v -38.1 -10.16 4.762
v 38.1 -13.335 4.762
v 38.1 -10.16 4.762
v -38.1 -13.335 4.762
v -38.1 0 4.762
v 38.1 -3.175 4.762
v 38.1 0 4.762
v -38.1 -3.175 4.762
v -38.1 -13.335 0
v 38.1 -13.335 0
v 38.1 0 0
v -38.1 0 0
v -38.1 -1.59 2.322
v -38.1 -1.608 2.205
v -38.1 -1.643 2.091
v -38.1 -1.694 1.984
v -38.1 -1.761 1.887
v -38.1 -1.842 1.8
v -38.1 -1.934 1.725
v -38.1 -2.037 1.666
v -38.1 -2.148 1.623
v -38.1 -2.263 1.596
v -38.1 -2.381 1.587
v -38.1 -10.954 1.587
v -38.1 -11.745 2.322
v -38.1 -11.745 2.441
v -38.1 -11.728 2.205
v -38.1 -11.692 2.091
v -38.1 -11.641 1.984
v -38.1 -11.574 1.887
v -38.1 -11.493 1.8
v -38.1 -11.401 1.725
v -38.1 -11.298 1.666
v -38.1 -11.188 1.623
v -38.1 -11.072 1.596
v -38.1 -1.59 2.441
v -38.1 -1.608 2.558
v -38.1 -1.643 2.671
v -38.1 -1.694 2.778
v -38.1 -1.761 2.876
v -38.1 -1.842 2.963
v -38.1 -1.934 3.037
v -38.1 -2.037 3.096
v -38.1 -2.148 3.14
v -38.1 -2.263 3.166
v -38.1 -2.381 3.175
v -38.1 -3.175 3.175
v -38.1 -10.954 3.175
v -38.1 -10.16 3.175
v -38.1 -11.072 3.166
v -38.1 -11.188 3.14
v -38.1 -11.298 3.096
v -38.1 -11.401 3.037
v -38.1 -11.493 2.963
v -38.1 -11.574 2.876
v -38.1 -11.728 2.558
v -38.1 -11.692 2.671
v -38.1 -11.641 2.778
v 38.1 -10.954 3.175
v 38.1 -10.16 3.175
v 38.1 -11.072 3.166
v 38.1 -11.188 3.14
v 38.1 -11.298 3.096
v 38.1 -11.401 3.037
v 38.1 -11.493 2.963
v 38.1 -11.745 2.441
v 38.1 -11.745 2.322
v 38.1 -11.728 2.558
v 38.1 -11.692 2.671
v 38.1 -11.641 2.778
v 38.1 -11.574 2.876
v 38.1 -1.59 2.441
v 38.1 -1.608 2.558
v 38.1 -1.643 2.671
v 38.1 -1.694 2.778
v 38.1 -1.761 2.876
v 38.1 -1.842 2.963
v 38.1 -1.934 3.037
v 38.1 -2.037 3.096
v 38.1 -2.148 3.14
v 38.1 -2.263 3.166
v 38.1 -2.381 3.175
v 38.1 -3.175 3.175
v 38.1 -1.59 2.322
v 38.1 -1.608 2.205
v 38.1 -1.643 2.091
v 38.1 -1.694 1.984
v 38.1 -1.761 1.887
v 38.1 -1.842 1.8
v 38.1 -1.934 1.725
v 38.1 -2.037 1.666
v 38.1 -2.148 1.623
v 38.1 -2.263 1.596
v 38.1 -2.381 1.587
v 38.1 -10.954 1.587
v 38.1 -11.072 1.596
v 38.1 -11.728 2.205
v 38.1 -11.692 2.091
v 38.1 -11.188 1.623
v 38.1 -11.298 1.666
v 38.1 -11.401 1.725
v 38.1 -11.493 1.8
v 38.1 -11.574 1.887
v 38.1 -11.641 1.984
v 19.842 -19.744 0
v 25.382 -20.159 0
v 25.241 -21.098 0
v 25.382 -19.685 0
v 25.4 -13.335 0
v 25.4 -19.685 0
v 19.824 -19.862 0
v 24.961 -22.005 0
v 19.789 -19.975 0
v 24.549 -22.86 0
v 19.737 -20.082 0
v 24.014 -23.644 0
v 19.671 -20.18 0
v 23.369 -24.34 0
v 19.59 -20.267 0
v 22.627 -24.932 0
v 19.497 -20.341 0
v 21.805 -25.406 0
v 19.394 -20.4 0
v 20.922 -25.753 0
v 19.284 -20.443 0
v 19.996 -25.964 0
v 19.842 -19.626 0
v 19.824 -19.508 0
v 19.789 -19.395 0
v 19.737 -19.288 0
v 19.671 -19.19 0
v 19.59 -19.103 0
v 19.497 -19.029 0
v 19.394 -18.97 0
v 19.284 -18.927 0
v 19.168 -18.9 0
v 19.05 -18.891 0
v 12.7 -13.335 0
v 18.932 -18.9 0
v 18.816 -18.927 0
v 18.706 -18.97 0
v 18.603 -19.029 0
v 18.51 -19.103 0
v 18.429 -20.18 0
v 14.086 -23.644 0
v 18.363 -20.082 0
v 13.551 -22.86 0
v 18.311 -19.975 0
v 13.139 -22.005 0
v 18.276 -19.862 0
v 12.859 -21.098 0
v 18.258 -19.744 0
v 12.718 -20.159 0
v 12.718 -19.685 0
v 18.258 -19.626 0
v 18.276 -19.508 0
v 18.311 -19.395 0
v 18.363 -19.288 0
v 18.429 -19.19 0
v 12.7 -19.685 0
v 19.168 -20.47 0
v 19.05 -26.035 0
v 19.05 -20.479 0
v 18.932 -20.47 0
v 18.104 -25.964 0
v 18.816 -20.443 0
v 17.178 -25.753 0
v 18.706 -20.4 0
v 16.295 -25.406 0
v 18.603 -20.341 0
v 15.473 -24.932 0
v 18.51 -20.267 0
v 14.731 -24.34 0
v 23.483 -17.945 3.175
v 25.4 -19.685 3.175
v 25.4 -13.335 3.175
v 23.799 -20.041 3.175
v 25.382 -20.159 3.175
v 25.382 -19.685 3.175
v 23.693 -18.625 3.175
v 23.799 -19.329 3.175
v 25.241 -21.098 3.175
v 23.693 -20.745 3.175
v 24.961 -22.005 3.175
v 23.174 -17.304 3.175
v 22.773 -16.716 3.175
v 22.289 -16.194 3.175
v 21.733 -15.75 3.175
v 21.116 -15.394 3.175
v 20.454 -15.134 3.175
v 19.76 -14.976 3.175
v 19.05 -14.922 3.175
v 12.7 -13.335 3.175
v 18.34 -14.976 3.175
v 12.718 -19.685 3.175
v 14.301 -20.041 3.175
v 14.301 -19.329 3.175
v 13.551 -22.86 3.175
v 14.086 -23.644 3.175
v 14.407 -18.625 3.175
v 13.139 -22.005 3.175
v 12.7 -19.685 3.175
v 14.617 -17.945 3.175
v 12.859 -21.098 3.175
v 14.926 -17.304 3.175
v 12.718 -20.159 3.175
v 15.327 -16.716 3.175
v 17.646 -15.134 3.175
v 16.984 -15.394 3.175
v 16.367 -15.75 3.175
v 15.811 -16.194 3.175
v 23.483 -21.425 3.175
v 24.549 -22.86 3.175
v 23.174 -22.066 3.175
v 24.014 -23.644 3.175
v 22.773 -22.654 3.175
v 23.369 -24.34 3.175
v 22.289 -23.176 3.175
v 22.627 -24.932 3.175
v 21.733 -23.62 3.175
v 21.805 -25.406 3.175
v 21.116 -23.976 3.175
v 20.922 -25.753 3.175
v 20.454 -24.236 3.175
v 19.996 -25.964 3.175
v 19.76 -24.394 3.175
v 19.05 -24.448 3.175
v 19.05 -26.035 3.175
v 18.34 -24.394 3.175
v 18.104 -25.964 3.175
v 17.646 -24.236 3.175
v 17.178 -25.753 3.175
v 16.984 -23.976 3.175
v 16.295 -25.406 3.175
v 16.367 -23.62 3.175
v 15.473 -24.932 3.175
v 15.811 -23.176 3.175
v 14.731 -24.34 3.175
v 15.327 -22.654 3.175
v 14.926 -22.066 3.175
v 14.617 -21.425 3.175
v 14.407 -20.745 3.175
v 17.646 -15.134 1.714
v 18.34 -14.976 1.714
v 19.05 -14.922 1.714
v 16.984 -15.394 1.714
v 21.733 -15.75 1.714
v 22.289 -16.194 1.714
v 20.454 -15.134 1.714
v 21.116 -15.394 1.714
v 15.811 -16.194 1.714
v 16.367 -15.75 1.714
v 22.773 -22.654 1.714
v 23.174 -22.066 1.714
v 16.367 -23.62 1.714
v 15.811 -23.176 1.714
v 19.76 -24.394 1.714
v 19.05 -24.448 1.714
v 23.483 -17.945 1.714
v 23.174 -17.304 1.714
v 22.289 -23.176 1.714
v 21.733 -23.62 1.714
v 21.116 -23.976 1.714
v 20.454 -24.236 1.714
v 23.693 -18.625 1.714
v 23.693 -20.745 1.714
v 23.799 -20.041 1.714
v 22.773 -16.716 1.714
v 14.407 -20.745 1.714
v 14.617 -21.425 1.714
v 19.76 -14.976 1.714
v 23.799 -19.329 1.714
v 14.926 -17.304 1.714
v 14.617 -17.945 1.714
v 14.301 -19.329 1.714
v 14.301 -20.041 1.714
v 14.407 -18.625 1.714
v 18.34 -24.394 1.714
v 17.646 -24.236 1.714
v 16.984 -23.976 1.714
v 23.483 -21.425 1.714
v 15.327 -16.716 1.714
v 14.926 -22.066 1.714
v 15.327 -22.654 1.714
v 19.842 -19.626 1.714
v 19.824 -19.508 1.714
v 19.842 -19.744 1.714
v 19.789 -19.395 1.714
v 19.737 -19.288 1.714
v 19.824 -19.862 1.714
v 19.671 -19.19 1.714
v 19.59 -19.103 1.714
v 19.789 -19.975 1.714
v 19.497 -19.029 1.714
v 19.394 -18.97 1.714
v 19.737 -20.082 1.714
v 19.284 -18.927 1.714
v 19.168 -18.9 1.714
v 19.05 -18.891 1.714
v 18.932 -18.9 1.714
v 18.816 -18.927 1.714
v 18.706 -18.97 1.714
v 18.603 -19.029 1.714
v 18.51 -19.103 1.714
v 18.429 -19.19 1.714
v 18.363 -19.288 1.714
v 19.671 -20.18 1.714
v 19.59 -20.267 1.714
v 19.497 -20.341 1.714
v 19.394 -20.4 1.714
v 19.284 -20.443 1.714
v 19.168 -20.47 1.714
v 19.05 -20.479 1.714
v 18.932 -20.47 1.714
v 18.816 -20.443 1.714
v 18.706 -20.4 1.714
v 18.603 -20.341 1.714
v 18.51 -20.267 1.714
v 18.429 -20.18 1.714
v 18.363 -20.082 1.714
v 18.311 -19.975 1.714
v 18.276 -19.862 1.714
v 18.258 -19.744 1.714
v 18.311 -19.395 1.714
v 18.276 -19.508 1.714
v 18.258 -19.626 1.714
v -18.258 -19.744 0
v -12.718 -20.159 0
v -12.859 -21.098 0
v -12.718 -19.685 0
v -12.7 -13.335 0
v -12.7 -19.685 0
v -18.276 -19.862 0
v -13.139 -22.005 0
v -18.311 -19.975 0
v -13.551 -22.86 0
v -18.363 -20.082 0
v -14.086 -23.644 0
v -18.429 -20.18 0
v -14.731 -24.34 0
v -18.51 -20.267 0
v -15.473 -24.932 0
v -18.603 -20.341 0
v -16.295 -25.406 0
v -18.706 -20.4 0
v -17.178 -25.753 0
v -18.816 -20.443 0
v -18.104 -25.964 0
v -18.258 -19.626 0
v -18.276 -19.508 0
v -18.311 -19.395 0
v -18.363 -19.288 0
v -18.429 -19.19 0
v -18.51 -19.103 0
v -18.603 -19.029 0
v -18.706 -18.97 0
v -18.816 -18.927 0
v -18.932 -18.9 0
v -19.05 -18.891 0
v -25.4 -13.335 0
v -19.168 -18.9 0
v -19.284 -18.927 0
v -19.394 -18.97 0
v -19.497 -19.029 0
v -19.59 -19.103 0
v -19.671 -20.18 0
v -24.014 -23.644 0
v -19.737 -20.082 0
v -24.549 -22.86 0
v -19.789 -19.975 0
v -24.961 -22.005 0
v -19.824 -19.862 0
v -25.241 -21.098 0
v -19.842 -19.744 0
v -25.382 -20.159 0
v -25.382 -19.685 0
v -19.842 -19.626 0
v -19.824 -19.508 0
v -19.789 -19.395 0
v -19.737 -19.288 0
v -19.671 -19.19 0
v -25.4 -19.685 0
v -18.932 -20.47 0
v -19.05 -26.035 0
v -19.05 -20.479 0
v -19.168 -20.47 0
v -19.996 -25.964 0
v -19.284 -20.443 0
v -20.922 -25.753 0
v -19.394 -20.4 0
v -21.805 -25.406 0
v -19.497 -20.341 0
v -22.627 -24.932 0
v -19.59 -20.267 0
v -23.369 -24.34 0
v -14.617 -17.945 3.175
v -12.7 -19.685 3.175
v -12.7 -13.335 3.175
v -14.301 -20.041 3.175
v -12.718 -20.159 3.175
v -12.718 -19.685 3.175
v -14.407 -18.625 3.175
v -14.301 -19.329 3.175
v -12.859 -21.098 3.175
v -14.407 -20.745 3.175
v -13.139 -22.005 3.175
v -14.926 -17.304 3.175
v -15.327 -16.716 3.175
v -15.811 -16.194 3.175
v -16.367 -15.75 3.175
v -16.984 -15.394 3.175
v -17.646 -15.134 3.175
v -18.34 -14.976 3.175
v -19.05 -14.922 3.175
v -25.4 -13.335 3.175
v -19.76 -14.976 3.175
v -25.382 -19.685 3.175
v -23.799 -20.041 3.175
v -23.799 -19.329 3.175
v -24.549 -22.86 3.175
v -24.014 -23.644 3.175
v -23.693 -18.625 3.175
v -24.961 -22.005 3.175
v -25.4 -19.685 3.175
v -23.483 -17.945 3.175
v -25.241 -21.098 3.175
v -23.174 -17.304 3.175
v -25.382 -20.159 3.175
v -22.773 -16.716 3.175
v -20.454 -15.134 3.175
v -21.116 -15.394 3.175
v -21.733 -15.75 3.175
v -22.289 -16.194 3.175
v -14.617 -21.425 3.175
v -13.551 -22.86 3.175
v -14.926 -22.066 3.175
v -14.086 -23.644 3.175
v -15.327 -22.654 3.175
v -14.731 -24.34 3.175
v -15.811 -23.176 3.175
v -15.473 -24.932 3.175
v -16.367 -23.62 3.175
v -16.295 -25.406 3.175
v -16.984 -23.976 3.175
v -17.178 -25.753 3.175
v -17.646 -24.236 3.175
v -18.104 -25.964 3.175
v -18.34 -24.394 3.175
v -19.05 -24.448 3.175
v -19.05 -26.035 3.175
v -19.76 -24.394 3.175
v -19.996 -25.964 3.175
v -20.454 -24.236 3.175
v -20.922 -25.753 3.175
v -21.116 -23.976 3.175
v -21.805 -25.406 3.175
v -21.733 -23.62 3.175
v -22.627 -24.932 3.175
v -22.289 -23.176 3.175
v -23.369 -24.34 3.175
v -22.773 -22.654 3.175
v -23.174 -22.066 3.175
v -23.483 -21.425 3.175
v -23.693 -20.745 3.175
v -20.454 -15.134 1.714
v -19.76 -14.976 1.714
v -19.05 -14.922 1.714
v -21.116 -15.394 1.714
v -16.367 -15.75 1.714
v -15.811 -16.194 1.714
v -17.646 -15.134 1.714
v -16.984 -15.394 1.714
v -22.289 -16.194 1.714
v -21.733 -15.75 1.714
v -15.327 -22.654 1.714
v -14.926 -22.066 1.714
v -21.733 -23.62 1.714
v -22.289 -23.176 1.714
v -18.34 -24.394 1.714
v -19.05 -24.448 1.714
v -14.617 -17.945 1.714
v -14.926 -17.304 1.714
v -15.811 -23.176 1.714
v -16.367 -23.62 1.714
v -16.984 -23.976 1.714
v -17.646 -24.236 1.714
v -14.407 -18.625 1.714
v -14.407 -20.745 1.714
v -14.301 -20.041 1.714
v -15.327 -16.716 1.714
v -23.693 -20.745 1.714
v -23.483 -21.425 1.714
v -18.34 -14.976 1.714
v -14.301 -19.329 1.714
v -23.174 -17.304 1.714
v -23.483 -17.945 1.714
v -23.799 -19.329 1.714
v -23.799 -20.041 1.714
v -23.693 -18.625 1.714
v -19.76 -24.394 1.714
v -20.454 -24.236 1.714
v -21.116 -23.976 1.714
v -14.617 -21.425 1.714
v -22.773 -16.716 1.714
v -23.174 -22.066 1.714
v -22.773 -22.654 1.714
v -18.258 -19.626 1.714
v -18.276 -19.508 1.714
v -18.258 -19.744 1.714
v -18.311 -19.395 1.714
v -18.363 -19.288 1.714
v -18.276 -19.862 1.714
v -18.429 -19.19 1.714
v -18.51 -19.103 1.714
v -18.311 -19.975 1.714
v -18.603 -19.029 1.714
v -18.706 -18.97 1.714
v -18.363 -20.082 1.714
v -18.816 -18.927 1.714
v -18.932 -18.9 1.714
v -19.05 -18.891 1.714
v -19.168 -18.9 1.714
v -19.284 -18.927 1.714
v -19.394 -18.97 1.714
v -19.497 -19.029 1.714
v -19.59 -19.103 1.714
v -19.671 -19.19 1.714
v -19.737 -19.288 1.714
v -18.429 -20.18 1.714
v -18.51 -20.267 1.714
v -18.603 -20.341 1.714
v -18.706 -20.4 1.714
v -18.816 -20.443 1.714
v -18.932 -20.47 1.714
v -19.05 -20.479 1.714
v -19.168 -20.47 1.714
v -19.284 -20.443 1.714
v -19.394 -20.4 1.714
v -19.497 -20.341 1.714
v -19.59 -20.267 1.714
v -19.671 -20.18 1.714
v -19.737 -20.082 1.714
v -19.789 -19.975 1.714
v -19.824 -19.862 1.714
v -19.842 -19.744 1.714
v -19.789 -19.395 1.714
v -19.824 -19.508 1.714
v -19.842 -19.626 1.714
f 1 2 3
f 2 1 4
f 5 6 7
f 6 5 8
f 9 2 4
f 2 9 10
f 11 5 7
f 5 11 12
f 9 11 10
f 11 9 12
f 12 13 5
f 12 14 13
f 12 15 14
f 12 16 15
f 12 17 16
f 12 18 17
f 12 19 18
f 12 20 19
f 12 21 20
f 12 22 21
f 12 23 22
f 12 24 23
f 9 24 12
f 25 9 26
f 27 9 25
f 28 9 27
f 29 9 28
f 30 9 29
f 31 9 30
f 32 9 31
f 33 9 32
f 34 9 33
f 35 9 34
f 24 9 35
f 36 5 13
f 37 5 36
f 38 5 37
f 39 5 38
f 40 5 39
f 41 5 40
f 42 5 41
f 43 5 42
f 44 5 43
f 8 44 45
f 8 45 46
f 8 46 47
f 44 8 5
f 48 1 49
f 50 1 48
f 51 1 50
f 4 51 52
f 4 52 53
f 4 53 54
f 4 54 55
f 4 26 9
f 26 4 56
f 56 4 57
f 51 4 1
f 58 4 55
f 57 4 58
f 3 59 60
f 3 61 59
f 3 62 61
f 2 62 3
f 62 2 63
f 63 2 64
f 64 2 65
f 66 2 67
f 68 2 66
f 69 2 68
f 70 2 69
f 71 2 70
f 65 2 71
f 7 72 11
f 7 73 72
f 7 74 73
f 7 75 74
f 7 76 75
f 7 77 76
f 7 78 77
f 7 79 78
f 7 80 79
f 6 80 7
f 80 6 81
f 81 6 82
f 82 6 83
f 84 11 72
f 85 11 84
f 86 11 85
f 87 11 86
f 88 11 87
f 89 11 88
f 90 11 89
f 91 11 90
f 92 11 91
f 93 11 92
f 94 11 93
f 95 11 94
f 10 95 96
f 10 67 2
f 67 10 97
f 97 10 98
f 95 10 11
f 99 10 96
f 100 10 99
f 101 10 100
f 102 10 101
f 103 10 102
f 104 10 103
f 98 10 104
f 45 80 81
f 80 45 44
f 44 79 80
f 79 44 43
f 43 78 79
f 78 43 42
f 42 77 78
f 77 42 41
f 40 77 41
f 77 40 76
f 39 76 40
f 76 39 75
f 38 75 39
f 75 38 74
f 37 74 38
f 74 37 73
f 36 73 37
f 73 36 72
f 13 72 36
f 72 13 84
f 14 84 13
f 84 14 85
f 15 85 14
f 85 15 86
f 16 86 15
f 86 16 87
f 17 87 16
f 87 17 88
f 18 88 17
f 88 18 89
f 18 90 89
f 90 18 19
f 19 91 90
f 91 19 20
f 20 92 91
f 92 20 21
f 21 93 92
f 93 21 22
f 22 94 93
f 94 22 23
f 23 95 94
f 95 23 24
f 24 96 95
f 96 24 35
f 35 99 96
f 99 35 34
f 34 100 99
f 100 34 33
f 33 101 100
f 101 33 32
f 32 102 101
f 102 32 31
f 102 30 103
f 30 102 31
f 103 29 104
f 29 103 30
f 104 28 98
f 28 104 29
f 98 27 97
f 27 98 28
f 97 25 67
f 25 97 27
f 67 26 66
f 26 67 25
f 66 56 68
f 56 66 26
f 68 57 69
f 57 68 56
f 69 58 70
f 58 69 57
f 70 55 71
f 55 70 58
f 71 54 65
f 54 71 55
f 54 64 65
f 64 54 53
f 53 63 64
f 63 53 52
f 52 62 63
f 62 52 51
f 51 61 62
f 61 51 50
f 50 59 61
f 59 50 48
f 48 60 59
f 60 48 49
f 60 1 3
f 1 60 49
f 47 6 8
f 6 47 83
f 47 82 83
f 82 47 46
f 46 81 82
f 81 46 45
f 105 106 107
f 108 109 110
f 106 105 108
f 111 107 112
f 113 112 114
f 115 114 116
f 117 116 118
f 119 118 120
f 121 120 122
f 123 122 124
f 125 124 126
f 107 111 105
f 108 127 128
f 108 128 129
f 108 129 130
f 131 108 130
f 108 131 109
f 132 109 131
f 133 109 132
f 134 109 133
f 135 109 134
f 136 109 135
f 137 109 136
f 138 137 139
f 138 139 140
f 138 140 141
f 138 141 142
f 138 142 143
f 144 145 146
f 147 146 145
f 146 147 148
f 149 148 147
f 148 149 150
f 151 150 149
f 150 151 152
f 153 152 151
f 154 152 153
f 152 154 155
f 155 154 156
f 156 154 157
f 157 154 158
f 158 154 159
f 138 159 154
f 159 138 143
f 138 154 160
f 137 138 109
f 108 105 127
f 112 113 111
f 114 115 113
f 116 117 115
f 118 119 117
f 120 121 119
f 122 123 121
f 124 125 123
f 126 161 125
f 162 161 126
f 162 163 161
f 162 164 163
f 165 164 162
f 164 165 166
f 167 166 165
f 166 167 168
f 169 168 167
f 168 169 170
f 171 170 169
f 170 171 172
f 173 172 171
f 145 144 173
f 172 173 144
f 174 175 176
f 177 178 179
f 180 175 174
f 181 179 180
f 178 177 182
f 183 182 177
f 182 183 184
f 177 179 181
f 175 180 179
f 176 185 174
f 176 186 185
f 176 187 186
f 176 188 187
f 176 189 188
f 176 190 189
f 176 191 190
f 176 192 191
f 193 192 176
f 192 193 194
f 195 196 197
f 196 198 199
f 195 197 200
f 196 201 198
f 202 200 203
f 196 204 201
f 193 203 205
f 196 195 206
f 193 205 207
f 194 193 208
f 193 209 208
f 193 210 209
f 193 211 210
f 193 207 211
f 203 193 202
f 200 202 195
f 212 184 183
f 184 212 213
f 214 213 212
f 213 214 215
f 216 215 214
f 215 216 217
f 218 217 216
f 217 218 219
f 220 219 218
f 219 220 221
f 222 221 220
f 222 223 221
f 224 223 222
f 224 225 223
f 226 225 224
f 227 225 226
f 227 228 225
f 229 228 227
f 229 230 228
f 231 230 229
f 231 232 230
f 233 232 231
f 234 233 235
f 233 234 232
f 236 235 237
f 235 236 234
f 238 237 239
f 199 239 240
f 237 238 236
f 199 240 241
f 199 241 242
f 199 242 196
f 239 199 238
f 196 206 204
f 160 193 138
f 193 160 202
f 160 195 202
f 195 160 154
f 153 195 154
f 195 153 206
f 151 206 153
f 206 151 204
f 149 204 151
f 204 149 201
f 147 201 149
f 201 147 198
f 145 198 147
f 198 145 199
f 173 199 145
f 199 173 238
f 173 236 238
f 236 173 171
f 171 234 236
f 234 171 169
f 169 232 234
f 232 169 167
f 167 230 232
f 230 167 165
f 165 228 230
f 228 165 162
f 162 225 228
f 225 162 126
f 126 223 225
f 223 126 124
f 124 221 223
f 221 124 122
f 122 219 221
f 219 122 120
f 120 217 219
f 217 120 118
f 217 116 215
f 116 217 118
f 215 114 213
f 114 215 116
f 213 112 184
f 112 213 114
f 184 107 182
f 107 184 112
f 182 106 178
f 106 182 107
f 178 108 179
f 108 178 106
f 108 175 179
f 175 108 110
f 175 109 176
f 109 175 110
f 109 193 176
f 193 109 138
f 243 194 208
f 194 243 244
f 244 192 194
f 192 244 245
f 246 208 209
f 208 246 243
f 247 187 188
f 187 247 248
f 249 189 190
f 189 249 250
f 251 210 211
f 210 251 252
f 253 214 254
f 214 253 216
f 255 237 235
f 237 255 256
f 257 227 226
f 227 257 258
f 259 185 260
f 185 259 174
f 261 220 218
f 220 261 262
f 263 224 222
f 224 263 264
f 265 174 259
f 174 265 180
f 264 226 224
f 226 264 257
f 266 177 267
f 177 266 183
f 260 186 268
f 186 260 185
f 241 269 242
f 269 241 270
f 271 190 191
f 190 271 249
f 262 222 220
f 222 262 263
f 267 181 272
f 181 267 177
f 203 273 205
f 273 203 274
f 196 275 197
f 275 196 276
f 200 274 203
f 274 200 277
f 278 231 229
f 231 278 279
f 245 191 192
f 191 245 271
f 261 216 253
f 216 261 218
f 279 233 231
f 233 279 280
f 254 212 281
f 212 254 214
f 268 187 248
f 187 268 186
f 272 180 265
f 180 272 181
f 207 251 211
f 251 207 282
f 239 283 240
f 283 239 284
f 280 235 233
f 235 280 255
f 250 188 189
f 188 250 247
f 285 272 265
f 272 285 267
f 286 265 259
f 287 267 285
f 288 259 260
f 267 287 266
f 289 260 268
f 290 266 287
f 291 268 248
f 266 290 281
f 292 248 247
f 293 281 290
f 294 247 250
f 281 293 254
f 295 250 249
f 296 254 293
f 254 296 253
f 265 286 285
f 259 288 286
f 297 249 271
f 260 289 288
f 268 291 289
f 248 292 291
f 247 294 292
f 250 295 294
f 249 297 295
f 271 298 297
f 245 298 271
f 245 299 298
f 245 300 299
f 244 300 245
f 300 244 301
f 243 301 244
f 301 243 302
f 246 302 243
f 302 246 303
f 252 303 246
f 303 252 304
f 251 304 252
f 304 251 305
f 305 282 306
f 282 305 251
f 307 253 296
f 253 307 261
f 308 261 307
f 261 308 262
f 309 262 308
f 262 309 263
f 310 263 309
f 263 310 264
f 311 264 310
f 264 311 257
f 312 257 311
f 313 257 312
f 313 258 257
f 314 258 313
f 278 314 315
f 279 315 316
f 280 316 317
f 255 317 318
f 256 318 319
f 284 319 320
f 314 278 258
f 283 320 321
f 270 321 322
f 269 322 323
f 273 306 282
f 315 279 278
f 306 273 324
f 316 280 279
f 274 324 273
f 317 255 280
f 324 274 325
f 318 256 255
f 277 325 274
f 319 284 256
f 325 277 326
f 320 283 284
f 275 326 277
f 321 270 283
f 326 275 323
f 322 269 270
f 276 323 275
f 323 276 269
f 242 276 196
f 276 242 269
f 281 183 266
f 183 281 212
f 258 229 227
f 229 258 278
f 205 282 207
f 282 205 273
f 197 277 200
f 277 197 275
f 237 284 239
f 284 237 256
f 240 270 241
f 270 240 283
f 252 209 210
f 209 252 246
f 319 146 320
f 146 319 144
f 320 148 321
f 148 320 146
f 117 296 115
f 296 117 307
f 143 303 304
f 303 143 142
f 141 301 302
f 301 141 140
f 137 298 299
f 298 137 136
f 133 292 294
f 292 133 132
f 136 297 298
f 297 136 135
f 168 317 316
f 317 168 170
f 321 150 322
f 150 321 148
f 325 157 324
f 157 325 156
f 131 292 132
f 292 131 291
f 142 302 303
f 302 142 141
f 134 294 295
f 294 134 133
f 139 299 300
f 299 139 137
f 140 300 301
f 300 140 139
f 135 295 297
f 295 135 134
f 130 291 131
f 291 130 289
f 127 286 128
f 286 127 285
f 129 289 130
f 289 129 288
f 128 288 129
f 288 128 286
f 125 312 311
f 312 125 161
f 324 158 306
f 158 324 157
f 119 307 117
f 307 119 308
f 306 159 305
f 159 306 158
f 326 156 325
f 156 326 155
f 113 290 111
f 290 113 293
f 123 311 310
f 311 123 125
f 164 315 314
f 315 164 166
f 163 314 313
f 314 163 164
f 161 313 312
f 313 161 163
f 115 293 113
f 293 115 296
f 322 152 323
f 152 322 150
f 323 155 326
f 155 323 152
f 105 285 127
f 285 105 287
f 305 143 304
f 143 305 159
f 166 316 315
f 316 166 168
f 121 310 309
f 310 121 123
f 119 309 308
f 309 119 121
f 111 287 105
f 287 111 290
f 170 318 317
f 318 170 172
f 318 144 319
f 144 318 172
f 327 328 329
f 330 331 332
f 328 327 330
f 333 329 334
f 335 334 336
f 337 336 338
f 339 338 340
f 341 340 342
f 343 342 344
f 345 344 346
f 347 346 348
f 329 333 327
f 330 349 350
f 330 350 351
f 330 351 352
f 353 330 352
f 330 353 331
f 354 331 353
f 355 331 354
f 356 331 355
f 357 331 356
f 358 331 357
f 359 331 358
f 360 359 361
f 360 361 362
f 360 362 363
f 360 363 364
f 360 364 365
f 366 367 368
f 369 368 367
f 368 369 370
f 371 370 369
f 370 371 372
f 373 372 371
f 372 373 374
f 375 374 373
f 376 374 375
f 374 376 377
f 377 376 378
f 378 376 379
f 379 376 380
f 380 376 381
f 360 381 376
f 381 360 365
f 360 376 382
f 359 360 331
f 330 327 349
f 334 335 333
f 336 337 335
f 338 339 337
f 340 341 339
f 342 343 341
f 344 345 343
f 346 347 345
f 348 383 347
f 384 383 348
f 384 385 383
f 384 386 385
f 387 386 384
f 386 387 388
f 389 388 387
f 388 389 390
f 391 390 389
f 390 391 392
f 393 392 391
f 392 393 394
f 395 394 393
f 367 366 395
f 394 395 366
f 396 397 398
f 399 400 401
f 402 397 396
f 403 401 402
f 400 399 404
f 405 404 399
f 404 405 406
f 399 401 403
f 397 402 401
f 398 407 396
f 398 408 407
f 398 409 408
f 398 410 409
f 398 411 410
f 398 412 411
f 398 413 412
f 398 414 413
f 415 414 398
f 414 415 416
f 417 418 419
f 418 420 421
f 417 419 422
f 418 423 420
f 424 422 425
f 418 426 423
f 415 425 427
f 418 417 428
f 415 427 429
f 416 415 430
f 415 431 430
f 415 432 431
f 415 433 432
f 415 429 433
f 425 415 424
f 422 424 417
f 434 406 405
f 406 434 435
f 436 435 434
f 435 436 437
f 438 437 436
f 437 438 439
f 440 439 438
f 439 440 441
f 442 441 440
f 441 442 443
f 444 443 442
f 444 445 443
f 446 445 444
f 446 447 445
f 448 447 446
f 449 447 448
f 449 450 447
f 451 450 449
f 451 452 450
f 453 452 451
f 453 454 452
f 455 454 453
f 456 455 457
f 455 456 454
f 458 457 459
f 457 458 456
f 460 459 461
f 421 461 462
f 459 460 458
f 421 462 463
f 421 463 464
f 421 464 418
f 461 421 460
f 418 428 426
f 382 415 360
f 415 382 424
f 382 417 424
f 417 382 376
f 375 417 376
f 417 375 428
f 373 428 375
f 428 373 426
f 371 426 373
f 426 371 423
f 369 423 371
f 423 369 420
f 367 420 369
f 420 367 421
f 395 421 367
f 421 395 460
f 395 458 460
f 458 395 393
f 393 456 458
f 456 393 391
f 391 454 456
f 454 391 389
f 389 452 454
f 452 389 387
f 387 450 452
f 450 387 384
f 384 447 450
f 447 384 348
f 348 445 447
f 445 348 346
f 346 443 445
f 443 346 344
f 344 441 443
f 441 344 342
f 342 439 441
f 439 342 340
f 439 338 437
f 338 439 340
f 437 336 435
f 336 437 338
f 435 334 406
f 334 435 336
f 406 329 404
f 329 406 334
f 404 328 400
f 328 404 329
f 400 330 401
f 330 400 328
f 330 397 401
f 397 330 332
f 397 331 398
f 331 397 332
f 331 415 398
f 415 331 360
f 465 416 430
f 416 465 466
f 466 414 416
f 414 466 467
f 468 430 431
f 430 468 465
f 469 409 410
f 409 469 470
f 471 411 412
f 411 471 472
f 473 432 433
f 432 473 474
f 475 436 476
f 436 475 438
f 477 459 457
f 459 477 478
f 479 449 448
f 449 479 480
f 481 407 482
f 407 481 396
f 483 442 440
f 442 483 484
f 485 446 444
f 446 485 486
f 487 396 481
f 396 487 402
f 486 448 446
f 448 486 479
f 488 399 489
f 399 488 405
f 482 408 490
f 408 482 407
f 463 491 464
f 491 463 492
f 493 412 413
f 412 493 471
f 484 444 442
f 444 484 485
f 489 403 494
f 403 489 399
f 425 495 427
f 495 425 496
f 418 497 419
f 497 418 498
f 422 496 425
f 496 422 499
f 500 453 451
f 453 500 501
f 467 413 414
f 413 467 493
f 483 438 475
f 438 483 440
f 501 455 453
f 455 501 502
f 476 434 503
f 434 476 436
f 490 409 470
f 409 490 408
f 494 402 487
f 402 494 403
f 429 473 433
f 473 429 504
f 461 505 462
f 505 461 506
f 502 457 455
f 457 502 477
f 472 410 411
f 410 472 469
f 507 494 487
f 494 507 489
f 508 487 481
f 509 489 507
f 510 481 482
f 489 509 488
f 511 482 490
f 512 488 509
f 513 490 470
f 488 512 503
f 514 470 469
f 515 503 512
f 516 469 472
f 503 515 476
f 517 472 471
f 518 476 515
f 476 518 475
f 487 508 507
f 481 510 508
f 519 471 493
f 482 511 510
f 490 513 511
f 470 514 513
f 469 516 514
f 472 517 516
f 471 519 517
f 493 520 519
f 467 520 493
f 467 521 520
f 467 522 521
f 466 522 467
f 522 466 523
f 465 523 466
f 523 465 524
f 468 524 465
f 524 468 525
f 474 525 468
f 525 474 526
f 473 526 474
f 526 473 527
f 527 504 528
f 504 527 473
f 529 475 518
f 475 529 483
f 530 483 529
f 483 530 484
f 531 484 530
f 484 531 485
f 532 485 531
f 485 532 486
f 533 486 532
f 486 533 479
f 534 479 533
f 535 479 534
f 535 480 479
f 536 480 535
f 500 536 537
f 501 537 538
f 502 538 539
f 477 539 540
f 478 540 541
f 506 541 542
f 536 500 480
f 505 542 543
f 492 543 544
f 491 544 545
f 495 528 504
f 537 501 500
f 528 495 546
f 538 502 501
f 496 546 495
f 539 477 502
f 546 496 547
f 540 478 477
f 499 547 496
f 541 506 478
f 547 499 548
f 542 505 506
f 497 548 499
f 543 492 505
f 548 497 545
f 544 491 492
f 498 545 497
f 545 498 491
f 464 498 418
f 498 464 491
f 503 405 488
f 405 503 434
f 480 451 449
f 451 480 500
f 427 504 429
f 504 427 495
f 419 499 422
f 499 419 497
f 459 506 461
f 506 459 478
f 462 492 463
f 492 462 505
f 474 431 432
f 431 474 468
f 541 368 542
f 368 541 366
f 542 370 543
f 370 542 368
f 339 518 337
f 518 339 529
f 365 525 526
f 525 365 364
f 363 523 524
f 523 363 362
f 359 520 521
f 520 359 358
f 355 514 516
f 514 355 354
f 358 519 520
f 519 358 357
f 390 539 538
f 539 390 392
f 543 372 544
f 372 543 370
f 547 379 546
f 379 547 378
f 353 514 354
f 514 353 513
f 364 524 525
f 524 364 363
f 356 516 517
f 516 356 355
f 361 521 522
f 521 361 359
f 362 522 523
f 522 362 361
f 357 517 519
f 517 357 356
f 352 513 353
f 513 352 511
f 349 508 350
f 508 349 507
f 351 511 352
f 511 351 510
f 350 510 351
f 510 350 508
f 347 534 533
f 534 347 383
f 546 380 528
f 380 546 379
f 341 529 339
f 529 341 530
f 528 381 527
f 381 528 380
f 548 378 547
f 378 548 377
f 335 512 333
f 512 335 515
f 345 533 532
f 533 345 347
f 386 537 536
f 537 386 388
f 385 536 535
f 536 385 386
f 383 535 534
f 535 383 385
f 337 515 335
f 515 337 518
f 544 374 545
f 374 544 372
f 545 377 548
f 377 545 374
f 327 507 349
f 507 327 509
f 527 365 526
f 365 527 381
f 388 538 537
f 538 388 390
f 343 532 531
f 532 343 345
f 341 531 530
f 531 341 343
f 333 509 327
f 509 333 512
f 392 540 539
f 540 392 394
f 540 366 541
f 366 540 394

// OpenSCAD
//BEGIN CUSTOMIZER VARIABLES
/* [Slot] */

//thickness
thickness = .0625;

//strip_height
strip_height = .4;

//length
length = 3;

/* [Push Pin] */

//pin_width, the pointy end
pin_width = .0625;

//pin_outer_width, need to name better
pin_outer_width = .375;

//num_of_pins
num_of_pins = 2;//[1:3]

/* [Advanced] */
//if you don't want fillets turn this off
fillets = true;

/* [Unit adjustment] */
//Basically are you using american units or real units
units_entered = 25.4;//[1:mm, 10:cm, 1000:meter, 25.4:inch, 304.8:foot]

//default is mm for most printers
desired_units_for_output = 1;//[1:mm, .1:cm, 0.001:meter, 0.0393701:inch, 0.00328084:foot]

//END CUSTOMIZER VARIABLES

unit_conversion_factor = units_entered*desired_units_for_output;

module rail(){
	difference(){
		cube([thickness*3,length,strip_height+thickness*2]);
		translate([thickness*1.5,-.005,thickness*1.5]){
			rotate([-90,0,0]){
				linear_extrude(length+.01)
				{
					hull(){
						circle(thickness/2,$fn=42);
						translate([0,-strip_height+thickness]){
							circle(thickness/2,$fn=42);
						}
					}
					translate([thickness*.5,thickness*1.5-strip_height]){
						square([thickness+.01,strip_height-thickness*2]);
					}
				}
			}
		}
	}
}

module push_pin_spot(){
	translate([0,0,(pin_outer_width+thickness*2)/2]){
		rotate([0,90,0]){
			difference(){
				linear_extrude(thickness*2){
					translate([(pin_outer_width+thickness*2)/4,0]){
						square([(pin_outer_width+thickness*2)/2,pin_outer_width+thickness*2],center=true);
					}
					circle((pin_outer_width+thickness*2)/2,$fn=42);
				}
				translate([0,0,thickness+0.005]){
					linear_extrude(thickness+.01){
						circle(pin_outer_width/2,$fn=42);
					}
				}
				translate([0,0,-0.005]){
					linear_extrude(thickness*2+.01){
						circle(pin_width/2,$fn=42);
					}
				}
			}
		}
	}
}

scale(unit_conversion_factor){
	rotate([90,-90,0]){//for display purposes
		translate([0,-length/2,0]){
			rail();
		}
		if(num_of_pins%2==1){
			translate([0,0,strip_height+thickness*2]){
				push_pin_spot();
			}
			if(num_of_pins==3){
				translate([0,-length/2+pin_outer_width-thickness*2,strip_height+thickness*2]){
					push_pin_spot();
				}
				translate([0,length/2-pin_outer_width+thickness*2,strip_height+thickness*2]){
					push_pin_spot();
				}
			}
		}
		else{
			translate([0,-length/4,strip_height+thickness*2]){
				push_pin_spot();
			}
			translate([0,length/4,strip_height+thickness*2]){
				push_pin_spot();
			}
		}
	}
}
